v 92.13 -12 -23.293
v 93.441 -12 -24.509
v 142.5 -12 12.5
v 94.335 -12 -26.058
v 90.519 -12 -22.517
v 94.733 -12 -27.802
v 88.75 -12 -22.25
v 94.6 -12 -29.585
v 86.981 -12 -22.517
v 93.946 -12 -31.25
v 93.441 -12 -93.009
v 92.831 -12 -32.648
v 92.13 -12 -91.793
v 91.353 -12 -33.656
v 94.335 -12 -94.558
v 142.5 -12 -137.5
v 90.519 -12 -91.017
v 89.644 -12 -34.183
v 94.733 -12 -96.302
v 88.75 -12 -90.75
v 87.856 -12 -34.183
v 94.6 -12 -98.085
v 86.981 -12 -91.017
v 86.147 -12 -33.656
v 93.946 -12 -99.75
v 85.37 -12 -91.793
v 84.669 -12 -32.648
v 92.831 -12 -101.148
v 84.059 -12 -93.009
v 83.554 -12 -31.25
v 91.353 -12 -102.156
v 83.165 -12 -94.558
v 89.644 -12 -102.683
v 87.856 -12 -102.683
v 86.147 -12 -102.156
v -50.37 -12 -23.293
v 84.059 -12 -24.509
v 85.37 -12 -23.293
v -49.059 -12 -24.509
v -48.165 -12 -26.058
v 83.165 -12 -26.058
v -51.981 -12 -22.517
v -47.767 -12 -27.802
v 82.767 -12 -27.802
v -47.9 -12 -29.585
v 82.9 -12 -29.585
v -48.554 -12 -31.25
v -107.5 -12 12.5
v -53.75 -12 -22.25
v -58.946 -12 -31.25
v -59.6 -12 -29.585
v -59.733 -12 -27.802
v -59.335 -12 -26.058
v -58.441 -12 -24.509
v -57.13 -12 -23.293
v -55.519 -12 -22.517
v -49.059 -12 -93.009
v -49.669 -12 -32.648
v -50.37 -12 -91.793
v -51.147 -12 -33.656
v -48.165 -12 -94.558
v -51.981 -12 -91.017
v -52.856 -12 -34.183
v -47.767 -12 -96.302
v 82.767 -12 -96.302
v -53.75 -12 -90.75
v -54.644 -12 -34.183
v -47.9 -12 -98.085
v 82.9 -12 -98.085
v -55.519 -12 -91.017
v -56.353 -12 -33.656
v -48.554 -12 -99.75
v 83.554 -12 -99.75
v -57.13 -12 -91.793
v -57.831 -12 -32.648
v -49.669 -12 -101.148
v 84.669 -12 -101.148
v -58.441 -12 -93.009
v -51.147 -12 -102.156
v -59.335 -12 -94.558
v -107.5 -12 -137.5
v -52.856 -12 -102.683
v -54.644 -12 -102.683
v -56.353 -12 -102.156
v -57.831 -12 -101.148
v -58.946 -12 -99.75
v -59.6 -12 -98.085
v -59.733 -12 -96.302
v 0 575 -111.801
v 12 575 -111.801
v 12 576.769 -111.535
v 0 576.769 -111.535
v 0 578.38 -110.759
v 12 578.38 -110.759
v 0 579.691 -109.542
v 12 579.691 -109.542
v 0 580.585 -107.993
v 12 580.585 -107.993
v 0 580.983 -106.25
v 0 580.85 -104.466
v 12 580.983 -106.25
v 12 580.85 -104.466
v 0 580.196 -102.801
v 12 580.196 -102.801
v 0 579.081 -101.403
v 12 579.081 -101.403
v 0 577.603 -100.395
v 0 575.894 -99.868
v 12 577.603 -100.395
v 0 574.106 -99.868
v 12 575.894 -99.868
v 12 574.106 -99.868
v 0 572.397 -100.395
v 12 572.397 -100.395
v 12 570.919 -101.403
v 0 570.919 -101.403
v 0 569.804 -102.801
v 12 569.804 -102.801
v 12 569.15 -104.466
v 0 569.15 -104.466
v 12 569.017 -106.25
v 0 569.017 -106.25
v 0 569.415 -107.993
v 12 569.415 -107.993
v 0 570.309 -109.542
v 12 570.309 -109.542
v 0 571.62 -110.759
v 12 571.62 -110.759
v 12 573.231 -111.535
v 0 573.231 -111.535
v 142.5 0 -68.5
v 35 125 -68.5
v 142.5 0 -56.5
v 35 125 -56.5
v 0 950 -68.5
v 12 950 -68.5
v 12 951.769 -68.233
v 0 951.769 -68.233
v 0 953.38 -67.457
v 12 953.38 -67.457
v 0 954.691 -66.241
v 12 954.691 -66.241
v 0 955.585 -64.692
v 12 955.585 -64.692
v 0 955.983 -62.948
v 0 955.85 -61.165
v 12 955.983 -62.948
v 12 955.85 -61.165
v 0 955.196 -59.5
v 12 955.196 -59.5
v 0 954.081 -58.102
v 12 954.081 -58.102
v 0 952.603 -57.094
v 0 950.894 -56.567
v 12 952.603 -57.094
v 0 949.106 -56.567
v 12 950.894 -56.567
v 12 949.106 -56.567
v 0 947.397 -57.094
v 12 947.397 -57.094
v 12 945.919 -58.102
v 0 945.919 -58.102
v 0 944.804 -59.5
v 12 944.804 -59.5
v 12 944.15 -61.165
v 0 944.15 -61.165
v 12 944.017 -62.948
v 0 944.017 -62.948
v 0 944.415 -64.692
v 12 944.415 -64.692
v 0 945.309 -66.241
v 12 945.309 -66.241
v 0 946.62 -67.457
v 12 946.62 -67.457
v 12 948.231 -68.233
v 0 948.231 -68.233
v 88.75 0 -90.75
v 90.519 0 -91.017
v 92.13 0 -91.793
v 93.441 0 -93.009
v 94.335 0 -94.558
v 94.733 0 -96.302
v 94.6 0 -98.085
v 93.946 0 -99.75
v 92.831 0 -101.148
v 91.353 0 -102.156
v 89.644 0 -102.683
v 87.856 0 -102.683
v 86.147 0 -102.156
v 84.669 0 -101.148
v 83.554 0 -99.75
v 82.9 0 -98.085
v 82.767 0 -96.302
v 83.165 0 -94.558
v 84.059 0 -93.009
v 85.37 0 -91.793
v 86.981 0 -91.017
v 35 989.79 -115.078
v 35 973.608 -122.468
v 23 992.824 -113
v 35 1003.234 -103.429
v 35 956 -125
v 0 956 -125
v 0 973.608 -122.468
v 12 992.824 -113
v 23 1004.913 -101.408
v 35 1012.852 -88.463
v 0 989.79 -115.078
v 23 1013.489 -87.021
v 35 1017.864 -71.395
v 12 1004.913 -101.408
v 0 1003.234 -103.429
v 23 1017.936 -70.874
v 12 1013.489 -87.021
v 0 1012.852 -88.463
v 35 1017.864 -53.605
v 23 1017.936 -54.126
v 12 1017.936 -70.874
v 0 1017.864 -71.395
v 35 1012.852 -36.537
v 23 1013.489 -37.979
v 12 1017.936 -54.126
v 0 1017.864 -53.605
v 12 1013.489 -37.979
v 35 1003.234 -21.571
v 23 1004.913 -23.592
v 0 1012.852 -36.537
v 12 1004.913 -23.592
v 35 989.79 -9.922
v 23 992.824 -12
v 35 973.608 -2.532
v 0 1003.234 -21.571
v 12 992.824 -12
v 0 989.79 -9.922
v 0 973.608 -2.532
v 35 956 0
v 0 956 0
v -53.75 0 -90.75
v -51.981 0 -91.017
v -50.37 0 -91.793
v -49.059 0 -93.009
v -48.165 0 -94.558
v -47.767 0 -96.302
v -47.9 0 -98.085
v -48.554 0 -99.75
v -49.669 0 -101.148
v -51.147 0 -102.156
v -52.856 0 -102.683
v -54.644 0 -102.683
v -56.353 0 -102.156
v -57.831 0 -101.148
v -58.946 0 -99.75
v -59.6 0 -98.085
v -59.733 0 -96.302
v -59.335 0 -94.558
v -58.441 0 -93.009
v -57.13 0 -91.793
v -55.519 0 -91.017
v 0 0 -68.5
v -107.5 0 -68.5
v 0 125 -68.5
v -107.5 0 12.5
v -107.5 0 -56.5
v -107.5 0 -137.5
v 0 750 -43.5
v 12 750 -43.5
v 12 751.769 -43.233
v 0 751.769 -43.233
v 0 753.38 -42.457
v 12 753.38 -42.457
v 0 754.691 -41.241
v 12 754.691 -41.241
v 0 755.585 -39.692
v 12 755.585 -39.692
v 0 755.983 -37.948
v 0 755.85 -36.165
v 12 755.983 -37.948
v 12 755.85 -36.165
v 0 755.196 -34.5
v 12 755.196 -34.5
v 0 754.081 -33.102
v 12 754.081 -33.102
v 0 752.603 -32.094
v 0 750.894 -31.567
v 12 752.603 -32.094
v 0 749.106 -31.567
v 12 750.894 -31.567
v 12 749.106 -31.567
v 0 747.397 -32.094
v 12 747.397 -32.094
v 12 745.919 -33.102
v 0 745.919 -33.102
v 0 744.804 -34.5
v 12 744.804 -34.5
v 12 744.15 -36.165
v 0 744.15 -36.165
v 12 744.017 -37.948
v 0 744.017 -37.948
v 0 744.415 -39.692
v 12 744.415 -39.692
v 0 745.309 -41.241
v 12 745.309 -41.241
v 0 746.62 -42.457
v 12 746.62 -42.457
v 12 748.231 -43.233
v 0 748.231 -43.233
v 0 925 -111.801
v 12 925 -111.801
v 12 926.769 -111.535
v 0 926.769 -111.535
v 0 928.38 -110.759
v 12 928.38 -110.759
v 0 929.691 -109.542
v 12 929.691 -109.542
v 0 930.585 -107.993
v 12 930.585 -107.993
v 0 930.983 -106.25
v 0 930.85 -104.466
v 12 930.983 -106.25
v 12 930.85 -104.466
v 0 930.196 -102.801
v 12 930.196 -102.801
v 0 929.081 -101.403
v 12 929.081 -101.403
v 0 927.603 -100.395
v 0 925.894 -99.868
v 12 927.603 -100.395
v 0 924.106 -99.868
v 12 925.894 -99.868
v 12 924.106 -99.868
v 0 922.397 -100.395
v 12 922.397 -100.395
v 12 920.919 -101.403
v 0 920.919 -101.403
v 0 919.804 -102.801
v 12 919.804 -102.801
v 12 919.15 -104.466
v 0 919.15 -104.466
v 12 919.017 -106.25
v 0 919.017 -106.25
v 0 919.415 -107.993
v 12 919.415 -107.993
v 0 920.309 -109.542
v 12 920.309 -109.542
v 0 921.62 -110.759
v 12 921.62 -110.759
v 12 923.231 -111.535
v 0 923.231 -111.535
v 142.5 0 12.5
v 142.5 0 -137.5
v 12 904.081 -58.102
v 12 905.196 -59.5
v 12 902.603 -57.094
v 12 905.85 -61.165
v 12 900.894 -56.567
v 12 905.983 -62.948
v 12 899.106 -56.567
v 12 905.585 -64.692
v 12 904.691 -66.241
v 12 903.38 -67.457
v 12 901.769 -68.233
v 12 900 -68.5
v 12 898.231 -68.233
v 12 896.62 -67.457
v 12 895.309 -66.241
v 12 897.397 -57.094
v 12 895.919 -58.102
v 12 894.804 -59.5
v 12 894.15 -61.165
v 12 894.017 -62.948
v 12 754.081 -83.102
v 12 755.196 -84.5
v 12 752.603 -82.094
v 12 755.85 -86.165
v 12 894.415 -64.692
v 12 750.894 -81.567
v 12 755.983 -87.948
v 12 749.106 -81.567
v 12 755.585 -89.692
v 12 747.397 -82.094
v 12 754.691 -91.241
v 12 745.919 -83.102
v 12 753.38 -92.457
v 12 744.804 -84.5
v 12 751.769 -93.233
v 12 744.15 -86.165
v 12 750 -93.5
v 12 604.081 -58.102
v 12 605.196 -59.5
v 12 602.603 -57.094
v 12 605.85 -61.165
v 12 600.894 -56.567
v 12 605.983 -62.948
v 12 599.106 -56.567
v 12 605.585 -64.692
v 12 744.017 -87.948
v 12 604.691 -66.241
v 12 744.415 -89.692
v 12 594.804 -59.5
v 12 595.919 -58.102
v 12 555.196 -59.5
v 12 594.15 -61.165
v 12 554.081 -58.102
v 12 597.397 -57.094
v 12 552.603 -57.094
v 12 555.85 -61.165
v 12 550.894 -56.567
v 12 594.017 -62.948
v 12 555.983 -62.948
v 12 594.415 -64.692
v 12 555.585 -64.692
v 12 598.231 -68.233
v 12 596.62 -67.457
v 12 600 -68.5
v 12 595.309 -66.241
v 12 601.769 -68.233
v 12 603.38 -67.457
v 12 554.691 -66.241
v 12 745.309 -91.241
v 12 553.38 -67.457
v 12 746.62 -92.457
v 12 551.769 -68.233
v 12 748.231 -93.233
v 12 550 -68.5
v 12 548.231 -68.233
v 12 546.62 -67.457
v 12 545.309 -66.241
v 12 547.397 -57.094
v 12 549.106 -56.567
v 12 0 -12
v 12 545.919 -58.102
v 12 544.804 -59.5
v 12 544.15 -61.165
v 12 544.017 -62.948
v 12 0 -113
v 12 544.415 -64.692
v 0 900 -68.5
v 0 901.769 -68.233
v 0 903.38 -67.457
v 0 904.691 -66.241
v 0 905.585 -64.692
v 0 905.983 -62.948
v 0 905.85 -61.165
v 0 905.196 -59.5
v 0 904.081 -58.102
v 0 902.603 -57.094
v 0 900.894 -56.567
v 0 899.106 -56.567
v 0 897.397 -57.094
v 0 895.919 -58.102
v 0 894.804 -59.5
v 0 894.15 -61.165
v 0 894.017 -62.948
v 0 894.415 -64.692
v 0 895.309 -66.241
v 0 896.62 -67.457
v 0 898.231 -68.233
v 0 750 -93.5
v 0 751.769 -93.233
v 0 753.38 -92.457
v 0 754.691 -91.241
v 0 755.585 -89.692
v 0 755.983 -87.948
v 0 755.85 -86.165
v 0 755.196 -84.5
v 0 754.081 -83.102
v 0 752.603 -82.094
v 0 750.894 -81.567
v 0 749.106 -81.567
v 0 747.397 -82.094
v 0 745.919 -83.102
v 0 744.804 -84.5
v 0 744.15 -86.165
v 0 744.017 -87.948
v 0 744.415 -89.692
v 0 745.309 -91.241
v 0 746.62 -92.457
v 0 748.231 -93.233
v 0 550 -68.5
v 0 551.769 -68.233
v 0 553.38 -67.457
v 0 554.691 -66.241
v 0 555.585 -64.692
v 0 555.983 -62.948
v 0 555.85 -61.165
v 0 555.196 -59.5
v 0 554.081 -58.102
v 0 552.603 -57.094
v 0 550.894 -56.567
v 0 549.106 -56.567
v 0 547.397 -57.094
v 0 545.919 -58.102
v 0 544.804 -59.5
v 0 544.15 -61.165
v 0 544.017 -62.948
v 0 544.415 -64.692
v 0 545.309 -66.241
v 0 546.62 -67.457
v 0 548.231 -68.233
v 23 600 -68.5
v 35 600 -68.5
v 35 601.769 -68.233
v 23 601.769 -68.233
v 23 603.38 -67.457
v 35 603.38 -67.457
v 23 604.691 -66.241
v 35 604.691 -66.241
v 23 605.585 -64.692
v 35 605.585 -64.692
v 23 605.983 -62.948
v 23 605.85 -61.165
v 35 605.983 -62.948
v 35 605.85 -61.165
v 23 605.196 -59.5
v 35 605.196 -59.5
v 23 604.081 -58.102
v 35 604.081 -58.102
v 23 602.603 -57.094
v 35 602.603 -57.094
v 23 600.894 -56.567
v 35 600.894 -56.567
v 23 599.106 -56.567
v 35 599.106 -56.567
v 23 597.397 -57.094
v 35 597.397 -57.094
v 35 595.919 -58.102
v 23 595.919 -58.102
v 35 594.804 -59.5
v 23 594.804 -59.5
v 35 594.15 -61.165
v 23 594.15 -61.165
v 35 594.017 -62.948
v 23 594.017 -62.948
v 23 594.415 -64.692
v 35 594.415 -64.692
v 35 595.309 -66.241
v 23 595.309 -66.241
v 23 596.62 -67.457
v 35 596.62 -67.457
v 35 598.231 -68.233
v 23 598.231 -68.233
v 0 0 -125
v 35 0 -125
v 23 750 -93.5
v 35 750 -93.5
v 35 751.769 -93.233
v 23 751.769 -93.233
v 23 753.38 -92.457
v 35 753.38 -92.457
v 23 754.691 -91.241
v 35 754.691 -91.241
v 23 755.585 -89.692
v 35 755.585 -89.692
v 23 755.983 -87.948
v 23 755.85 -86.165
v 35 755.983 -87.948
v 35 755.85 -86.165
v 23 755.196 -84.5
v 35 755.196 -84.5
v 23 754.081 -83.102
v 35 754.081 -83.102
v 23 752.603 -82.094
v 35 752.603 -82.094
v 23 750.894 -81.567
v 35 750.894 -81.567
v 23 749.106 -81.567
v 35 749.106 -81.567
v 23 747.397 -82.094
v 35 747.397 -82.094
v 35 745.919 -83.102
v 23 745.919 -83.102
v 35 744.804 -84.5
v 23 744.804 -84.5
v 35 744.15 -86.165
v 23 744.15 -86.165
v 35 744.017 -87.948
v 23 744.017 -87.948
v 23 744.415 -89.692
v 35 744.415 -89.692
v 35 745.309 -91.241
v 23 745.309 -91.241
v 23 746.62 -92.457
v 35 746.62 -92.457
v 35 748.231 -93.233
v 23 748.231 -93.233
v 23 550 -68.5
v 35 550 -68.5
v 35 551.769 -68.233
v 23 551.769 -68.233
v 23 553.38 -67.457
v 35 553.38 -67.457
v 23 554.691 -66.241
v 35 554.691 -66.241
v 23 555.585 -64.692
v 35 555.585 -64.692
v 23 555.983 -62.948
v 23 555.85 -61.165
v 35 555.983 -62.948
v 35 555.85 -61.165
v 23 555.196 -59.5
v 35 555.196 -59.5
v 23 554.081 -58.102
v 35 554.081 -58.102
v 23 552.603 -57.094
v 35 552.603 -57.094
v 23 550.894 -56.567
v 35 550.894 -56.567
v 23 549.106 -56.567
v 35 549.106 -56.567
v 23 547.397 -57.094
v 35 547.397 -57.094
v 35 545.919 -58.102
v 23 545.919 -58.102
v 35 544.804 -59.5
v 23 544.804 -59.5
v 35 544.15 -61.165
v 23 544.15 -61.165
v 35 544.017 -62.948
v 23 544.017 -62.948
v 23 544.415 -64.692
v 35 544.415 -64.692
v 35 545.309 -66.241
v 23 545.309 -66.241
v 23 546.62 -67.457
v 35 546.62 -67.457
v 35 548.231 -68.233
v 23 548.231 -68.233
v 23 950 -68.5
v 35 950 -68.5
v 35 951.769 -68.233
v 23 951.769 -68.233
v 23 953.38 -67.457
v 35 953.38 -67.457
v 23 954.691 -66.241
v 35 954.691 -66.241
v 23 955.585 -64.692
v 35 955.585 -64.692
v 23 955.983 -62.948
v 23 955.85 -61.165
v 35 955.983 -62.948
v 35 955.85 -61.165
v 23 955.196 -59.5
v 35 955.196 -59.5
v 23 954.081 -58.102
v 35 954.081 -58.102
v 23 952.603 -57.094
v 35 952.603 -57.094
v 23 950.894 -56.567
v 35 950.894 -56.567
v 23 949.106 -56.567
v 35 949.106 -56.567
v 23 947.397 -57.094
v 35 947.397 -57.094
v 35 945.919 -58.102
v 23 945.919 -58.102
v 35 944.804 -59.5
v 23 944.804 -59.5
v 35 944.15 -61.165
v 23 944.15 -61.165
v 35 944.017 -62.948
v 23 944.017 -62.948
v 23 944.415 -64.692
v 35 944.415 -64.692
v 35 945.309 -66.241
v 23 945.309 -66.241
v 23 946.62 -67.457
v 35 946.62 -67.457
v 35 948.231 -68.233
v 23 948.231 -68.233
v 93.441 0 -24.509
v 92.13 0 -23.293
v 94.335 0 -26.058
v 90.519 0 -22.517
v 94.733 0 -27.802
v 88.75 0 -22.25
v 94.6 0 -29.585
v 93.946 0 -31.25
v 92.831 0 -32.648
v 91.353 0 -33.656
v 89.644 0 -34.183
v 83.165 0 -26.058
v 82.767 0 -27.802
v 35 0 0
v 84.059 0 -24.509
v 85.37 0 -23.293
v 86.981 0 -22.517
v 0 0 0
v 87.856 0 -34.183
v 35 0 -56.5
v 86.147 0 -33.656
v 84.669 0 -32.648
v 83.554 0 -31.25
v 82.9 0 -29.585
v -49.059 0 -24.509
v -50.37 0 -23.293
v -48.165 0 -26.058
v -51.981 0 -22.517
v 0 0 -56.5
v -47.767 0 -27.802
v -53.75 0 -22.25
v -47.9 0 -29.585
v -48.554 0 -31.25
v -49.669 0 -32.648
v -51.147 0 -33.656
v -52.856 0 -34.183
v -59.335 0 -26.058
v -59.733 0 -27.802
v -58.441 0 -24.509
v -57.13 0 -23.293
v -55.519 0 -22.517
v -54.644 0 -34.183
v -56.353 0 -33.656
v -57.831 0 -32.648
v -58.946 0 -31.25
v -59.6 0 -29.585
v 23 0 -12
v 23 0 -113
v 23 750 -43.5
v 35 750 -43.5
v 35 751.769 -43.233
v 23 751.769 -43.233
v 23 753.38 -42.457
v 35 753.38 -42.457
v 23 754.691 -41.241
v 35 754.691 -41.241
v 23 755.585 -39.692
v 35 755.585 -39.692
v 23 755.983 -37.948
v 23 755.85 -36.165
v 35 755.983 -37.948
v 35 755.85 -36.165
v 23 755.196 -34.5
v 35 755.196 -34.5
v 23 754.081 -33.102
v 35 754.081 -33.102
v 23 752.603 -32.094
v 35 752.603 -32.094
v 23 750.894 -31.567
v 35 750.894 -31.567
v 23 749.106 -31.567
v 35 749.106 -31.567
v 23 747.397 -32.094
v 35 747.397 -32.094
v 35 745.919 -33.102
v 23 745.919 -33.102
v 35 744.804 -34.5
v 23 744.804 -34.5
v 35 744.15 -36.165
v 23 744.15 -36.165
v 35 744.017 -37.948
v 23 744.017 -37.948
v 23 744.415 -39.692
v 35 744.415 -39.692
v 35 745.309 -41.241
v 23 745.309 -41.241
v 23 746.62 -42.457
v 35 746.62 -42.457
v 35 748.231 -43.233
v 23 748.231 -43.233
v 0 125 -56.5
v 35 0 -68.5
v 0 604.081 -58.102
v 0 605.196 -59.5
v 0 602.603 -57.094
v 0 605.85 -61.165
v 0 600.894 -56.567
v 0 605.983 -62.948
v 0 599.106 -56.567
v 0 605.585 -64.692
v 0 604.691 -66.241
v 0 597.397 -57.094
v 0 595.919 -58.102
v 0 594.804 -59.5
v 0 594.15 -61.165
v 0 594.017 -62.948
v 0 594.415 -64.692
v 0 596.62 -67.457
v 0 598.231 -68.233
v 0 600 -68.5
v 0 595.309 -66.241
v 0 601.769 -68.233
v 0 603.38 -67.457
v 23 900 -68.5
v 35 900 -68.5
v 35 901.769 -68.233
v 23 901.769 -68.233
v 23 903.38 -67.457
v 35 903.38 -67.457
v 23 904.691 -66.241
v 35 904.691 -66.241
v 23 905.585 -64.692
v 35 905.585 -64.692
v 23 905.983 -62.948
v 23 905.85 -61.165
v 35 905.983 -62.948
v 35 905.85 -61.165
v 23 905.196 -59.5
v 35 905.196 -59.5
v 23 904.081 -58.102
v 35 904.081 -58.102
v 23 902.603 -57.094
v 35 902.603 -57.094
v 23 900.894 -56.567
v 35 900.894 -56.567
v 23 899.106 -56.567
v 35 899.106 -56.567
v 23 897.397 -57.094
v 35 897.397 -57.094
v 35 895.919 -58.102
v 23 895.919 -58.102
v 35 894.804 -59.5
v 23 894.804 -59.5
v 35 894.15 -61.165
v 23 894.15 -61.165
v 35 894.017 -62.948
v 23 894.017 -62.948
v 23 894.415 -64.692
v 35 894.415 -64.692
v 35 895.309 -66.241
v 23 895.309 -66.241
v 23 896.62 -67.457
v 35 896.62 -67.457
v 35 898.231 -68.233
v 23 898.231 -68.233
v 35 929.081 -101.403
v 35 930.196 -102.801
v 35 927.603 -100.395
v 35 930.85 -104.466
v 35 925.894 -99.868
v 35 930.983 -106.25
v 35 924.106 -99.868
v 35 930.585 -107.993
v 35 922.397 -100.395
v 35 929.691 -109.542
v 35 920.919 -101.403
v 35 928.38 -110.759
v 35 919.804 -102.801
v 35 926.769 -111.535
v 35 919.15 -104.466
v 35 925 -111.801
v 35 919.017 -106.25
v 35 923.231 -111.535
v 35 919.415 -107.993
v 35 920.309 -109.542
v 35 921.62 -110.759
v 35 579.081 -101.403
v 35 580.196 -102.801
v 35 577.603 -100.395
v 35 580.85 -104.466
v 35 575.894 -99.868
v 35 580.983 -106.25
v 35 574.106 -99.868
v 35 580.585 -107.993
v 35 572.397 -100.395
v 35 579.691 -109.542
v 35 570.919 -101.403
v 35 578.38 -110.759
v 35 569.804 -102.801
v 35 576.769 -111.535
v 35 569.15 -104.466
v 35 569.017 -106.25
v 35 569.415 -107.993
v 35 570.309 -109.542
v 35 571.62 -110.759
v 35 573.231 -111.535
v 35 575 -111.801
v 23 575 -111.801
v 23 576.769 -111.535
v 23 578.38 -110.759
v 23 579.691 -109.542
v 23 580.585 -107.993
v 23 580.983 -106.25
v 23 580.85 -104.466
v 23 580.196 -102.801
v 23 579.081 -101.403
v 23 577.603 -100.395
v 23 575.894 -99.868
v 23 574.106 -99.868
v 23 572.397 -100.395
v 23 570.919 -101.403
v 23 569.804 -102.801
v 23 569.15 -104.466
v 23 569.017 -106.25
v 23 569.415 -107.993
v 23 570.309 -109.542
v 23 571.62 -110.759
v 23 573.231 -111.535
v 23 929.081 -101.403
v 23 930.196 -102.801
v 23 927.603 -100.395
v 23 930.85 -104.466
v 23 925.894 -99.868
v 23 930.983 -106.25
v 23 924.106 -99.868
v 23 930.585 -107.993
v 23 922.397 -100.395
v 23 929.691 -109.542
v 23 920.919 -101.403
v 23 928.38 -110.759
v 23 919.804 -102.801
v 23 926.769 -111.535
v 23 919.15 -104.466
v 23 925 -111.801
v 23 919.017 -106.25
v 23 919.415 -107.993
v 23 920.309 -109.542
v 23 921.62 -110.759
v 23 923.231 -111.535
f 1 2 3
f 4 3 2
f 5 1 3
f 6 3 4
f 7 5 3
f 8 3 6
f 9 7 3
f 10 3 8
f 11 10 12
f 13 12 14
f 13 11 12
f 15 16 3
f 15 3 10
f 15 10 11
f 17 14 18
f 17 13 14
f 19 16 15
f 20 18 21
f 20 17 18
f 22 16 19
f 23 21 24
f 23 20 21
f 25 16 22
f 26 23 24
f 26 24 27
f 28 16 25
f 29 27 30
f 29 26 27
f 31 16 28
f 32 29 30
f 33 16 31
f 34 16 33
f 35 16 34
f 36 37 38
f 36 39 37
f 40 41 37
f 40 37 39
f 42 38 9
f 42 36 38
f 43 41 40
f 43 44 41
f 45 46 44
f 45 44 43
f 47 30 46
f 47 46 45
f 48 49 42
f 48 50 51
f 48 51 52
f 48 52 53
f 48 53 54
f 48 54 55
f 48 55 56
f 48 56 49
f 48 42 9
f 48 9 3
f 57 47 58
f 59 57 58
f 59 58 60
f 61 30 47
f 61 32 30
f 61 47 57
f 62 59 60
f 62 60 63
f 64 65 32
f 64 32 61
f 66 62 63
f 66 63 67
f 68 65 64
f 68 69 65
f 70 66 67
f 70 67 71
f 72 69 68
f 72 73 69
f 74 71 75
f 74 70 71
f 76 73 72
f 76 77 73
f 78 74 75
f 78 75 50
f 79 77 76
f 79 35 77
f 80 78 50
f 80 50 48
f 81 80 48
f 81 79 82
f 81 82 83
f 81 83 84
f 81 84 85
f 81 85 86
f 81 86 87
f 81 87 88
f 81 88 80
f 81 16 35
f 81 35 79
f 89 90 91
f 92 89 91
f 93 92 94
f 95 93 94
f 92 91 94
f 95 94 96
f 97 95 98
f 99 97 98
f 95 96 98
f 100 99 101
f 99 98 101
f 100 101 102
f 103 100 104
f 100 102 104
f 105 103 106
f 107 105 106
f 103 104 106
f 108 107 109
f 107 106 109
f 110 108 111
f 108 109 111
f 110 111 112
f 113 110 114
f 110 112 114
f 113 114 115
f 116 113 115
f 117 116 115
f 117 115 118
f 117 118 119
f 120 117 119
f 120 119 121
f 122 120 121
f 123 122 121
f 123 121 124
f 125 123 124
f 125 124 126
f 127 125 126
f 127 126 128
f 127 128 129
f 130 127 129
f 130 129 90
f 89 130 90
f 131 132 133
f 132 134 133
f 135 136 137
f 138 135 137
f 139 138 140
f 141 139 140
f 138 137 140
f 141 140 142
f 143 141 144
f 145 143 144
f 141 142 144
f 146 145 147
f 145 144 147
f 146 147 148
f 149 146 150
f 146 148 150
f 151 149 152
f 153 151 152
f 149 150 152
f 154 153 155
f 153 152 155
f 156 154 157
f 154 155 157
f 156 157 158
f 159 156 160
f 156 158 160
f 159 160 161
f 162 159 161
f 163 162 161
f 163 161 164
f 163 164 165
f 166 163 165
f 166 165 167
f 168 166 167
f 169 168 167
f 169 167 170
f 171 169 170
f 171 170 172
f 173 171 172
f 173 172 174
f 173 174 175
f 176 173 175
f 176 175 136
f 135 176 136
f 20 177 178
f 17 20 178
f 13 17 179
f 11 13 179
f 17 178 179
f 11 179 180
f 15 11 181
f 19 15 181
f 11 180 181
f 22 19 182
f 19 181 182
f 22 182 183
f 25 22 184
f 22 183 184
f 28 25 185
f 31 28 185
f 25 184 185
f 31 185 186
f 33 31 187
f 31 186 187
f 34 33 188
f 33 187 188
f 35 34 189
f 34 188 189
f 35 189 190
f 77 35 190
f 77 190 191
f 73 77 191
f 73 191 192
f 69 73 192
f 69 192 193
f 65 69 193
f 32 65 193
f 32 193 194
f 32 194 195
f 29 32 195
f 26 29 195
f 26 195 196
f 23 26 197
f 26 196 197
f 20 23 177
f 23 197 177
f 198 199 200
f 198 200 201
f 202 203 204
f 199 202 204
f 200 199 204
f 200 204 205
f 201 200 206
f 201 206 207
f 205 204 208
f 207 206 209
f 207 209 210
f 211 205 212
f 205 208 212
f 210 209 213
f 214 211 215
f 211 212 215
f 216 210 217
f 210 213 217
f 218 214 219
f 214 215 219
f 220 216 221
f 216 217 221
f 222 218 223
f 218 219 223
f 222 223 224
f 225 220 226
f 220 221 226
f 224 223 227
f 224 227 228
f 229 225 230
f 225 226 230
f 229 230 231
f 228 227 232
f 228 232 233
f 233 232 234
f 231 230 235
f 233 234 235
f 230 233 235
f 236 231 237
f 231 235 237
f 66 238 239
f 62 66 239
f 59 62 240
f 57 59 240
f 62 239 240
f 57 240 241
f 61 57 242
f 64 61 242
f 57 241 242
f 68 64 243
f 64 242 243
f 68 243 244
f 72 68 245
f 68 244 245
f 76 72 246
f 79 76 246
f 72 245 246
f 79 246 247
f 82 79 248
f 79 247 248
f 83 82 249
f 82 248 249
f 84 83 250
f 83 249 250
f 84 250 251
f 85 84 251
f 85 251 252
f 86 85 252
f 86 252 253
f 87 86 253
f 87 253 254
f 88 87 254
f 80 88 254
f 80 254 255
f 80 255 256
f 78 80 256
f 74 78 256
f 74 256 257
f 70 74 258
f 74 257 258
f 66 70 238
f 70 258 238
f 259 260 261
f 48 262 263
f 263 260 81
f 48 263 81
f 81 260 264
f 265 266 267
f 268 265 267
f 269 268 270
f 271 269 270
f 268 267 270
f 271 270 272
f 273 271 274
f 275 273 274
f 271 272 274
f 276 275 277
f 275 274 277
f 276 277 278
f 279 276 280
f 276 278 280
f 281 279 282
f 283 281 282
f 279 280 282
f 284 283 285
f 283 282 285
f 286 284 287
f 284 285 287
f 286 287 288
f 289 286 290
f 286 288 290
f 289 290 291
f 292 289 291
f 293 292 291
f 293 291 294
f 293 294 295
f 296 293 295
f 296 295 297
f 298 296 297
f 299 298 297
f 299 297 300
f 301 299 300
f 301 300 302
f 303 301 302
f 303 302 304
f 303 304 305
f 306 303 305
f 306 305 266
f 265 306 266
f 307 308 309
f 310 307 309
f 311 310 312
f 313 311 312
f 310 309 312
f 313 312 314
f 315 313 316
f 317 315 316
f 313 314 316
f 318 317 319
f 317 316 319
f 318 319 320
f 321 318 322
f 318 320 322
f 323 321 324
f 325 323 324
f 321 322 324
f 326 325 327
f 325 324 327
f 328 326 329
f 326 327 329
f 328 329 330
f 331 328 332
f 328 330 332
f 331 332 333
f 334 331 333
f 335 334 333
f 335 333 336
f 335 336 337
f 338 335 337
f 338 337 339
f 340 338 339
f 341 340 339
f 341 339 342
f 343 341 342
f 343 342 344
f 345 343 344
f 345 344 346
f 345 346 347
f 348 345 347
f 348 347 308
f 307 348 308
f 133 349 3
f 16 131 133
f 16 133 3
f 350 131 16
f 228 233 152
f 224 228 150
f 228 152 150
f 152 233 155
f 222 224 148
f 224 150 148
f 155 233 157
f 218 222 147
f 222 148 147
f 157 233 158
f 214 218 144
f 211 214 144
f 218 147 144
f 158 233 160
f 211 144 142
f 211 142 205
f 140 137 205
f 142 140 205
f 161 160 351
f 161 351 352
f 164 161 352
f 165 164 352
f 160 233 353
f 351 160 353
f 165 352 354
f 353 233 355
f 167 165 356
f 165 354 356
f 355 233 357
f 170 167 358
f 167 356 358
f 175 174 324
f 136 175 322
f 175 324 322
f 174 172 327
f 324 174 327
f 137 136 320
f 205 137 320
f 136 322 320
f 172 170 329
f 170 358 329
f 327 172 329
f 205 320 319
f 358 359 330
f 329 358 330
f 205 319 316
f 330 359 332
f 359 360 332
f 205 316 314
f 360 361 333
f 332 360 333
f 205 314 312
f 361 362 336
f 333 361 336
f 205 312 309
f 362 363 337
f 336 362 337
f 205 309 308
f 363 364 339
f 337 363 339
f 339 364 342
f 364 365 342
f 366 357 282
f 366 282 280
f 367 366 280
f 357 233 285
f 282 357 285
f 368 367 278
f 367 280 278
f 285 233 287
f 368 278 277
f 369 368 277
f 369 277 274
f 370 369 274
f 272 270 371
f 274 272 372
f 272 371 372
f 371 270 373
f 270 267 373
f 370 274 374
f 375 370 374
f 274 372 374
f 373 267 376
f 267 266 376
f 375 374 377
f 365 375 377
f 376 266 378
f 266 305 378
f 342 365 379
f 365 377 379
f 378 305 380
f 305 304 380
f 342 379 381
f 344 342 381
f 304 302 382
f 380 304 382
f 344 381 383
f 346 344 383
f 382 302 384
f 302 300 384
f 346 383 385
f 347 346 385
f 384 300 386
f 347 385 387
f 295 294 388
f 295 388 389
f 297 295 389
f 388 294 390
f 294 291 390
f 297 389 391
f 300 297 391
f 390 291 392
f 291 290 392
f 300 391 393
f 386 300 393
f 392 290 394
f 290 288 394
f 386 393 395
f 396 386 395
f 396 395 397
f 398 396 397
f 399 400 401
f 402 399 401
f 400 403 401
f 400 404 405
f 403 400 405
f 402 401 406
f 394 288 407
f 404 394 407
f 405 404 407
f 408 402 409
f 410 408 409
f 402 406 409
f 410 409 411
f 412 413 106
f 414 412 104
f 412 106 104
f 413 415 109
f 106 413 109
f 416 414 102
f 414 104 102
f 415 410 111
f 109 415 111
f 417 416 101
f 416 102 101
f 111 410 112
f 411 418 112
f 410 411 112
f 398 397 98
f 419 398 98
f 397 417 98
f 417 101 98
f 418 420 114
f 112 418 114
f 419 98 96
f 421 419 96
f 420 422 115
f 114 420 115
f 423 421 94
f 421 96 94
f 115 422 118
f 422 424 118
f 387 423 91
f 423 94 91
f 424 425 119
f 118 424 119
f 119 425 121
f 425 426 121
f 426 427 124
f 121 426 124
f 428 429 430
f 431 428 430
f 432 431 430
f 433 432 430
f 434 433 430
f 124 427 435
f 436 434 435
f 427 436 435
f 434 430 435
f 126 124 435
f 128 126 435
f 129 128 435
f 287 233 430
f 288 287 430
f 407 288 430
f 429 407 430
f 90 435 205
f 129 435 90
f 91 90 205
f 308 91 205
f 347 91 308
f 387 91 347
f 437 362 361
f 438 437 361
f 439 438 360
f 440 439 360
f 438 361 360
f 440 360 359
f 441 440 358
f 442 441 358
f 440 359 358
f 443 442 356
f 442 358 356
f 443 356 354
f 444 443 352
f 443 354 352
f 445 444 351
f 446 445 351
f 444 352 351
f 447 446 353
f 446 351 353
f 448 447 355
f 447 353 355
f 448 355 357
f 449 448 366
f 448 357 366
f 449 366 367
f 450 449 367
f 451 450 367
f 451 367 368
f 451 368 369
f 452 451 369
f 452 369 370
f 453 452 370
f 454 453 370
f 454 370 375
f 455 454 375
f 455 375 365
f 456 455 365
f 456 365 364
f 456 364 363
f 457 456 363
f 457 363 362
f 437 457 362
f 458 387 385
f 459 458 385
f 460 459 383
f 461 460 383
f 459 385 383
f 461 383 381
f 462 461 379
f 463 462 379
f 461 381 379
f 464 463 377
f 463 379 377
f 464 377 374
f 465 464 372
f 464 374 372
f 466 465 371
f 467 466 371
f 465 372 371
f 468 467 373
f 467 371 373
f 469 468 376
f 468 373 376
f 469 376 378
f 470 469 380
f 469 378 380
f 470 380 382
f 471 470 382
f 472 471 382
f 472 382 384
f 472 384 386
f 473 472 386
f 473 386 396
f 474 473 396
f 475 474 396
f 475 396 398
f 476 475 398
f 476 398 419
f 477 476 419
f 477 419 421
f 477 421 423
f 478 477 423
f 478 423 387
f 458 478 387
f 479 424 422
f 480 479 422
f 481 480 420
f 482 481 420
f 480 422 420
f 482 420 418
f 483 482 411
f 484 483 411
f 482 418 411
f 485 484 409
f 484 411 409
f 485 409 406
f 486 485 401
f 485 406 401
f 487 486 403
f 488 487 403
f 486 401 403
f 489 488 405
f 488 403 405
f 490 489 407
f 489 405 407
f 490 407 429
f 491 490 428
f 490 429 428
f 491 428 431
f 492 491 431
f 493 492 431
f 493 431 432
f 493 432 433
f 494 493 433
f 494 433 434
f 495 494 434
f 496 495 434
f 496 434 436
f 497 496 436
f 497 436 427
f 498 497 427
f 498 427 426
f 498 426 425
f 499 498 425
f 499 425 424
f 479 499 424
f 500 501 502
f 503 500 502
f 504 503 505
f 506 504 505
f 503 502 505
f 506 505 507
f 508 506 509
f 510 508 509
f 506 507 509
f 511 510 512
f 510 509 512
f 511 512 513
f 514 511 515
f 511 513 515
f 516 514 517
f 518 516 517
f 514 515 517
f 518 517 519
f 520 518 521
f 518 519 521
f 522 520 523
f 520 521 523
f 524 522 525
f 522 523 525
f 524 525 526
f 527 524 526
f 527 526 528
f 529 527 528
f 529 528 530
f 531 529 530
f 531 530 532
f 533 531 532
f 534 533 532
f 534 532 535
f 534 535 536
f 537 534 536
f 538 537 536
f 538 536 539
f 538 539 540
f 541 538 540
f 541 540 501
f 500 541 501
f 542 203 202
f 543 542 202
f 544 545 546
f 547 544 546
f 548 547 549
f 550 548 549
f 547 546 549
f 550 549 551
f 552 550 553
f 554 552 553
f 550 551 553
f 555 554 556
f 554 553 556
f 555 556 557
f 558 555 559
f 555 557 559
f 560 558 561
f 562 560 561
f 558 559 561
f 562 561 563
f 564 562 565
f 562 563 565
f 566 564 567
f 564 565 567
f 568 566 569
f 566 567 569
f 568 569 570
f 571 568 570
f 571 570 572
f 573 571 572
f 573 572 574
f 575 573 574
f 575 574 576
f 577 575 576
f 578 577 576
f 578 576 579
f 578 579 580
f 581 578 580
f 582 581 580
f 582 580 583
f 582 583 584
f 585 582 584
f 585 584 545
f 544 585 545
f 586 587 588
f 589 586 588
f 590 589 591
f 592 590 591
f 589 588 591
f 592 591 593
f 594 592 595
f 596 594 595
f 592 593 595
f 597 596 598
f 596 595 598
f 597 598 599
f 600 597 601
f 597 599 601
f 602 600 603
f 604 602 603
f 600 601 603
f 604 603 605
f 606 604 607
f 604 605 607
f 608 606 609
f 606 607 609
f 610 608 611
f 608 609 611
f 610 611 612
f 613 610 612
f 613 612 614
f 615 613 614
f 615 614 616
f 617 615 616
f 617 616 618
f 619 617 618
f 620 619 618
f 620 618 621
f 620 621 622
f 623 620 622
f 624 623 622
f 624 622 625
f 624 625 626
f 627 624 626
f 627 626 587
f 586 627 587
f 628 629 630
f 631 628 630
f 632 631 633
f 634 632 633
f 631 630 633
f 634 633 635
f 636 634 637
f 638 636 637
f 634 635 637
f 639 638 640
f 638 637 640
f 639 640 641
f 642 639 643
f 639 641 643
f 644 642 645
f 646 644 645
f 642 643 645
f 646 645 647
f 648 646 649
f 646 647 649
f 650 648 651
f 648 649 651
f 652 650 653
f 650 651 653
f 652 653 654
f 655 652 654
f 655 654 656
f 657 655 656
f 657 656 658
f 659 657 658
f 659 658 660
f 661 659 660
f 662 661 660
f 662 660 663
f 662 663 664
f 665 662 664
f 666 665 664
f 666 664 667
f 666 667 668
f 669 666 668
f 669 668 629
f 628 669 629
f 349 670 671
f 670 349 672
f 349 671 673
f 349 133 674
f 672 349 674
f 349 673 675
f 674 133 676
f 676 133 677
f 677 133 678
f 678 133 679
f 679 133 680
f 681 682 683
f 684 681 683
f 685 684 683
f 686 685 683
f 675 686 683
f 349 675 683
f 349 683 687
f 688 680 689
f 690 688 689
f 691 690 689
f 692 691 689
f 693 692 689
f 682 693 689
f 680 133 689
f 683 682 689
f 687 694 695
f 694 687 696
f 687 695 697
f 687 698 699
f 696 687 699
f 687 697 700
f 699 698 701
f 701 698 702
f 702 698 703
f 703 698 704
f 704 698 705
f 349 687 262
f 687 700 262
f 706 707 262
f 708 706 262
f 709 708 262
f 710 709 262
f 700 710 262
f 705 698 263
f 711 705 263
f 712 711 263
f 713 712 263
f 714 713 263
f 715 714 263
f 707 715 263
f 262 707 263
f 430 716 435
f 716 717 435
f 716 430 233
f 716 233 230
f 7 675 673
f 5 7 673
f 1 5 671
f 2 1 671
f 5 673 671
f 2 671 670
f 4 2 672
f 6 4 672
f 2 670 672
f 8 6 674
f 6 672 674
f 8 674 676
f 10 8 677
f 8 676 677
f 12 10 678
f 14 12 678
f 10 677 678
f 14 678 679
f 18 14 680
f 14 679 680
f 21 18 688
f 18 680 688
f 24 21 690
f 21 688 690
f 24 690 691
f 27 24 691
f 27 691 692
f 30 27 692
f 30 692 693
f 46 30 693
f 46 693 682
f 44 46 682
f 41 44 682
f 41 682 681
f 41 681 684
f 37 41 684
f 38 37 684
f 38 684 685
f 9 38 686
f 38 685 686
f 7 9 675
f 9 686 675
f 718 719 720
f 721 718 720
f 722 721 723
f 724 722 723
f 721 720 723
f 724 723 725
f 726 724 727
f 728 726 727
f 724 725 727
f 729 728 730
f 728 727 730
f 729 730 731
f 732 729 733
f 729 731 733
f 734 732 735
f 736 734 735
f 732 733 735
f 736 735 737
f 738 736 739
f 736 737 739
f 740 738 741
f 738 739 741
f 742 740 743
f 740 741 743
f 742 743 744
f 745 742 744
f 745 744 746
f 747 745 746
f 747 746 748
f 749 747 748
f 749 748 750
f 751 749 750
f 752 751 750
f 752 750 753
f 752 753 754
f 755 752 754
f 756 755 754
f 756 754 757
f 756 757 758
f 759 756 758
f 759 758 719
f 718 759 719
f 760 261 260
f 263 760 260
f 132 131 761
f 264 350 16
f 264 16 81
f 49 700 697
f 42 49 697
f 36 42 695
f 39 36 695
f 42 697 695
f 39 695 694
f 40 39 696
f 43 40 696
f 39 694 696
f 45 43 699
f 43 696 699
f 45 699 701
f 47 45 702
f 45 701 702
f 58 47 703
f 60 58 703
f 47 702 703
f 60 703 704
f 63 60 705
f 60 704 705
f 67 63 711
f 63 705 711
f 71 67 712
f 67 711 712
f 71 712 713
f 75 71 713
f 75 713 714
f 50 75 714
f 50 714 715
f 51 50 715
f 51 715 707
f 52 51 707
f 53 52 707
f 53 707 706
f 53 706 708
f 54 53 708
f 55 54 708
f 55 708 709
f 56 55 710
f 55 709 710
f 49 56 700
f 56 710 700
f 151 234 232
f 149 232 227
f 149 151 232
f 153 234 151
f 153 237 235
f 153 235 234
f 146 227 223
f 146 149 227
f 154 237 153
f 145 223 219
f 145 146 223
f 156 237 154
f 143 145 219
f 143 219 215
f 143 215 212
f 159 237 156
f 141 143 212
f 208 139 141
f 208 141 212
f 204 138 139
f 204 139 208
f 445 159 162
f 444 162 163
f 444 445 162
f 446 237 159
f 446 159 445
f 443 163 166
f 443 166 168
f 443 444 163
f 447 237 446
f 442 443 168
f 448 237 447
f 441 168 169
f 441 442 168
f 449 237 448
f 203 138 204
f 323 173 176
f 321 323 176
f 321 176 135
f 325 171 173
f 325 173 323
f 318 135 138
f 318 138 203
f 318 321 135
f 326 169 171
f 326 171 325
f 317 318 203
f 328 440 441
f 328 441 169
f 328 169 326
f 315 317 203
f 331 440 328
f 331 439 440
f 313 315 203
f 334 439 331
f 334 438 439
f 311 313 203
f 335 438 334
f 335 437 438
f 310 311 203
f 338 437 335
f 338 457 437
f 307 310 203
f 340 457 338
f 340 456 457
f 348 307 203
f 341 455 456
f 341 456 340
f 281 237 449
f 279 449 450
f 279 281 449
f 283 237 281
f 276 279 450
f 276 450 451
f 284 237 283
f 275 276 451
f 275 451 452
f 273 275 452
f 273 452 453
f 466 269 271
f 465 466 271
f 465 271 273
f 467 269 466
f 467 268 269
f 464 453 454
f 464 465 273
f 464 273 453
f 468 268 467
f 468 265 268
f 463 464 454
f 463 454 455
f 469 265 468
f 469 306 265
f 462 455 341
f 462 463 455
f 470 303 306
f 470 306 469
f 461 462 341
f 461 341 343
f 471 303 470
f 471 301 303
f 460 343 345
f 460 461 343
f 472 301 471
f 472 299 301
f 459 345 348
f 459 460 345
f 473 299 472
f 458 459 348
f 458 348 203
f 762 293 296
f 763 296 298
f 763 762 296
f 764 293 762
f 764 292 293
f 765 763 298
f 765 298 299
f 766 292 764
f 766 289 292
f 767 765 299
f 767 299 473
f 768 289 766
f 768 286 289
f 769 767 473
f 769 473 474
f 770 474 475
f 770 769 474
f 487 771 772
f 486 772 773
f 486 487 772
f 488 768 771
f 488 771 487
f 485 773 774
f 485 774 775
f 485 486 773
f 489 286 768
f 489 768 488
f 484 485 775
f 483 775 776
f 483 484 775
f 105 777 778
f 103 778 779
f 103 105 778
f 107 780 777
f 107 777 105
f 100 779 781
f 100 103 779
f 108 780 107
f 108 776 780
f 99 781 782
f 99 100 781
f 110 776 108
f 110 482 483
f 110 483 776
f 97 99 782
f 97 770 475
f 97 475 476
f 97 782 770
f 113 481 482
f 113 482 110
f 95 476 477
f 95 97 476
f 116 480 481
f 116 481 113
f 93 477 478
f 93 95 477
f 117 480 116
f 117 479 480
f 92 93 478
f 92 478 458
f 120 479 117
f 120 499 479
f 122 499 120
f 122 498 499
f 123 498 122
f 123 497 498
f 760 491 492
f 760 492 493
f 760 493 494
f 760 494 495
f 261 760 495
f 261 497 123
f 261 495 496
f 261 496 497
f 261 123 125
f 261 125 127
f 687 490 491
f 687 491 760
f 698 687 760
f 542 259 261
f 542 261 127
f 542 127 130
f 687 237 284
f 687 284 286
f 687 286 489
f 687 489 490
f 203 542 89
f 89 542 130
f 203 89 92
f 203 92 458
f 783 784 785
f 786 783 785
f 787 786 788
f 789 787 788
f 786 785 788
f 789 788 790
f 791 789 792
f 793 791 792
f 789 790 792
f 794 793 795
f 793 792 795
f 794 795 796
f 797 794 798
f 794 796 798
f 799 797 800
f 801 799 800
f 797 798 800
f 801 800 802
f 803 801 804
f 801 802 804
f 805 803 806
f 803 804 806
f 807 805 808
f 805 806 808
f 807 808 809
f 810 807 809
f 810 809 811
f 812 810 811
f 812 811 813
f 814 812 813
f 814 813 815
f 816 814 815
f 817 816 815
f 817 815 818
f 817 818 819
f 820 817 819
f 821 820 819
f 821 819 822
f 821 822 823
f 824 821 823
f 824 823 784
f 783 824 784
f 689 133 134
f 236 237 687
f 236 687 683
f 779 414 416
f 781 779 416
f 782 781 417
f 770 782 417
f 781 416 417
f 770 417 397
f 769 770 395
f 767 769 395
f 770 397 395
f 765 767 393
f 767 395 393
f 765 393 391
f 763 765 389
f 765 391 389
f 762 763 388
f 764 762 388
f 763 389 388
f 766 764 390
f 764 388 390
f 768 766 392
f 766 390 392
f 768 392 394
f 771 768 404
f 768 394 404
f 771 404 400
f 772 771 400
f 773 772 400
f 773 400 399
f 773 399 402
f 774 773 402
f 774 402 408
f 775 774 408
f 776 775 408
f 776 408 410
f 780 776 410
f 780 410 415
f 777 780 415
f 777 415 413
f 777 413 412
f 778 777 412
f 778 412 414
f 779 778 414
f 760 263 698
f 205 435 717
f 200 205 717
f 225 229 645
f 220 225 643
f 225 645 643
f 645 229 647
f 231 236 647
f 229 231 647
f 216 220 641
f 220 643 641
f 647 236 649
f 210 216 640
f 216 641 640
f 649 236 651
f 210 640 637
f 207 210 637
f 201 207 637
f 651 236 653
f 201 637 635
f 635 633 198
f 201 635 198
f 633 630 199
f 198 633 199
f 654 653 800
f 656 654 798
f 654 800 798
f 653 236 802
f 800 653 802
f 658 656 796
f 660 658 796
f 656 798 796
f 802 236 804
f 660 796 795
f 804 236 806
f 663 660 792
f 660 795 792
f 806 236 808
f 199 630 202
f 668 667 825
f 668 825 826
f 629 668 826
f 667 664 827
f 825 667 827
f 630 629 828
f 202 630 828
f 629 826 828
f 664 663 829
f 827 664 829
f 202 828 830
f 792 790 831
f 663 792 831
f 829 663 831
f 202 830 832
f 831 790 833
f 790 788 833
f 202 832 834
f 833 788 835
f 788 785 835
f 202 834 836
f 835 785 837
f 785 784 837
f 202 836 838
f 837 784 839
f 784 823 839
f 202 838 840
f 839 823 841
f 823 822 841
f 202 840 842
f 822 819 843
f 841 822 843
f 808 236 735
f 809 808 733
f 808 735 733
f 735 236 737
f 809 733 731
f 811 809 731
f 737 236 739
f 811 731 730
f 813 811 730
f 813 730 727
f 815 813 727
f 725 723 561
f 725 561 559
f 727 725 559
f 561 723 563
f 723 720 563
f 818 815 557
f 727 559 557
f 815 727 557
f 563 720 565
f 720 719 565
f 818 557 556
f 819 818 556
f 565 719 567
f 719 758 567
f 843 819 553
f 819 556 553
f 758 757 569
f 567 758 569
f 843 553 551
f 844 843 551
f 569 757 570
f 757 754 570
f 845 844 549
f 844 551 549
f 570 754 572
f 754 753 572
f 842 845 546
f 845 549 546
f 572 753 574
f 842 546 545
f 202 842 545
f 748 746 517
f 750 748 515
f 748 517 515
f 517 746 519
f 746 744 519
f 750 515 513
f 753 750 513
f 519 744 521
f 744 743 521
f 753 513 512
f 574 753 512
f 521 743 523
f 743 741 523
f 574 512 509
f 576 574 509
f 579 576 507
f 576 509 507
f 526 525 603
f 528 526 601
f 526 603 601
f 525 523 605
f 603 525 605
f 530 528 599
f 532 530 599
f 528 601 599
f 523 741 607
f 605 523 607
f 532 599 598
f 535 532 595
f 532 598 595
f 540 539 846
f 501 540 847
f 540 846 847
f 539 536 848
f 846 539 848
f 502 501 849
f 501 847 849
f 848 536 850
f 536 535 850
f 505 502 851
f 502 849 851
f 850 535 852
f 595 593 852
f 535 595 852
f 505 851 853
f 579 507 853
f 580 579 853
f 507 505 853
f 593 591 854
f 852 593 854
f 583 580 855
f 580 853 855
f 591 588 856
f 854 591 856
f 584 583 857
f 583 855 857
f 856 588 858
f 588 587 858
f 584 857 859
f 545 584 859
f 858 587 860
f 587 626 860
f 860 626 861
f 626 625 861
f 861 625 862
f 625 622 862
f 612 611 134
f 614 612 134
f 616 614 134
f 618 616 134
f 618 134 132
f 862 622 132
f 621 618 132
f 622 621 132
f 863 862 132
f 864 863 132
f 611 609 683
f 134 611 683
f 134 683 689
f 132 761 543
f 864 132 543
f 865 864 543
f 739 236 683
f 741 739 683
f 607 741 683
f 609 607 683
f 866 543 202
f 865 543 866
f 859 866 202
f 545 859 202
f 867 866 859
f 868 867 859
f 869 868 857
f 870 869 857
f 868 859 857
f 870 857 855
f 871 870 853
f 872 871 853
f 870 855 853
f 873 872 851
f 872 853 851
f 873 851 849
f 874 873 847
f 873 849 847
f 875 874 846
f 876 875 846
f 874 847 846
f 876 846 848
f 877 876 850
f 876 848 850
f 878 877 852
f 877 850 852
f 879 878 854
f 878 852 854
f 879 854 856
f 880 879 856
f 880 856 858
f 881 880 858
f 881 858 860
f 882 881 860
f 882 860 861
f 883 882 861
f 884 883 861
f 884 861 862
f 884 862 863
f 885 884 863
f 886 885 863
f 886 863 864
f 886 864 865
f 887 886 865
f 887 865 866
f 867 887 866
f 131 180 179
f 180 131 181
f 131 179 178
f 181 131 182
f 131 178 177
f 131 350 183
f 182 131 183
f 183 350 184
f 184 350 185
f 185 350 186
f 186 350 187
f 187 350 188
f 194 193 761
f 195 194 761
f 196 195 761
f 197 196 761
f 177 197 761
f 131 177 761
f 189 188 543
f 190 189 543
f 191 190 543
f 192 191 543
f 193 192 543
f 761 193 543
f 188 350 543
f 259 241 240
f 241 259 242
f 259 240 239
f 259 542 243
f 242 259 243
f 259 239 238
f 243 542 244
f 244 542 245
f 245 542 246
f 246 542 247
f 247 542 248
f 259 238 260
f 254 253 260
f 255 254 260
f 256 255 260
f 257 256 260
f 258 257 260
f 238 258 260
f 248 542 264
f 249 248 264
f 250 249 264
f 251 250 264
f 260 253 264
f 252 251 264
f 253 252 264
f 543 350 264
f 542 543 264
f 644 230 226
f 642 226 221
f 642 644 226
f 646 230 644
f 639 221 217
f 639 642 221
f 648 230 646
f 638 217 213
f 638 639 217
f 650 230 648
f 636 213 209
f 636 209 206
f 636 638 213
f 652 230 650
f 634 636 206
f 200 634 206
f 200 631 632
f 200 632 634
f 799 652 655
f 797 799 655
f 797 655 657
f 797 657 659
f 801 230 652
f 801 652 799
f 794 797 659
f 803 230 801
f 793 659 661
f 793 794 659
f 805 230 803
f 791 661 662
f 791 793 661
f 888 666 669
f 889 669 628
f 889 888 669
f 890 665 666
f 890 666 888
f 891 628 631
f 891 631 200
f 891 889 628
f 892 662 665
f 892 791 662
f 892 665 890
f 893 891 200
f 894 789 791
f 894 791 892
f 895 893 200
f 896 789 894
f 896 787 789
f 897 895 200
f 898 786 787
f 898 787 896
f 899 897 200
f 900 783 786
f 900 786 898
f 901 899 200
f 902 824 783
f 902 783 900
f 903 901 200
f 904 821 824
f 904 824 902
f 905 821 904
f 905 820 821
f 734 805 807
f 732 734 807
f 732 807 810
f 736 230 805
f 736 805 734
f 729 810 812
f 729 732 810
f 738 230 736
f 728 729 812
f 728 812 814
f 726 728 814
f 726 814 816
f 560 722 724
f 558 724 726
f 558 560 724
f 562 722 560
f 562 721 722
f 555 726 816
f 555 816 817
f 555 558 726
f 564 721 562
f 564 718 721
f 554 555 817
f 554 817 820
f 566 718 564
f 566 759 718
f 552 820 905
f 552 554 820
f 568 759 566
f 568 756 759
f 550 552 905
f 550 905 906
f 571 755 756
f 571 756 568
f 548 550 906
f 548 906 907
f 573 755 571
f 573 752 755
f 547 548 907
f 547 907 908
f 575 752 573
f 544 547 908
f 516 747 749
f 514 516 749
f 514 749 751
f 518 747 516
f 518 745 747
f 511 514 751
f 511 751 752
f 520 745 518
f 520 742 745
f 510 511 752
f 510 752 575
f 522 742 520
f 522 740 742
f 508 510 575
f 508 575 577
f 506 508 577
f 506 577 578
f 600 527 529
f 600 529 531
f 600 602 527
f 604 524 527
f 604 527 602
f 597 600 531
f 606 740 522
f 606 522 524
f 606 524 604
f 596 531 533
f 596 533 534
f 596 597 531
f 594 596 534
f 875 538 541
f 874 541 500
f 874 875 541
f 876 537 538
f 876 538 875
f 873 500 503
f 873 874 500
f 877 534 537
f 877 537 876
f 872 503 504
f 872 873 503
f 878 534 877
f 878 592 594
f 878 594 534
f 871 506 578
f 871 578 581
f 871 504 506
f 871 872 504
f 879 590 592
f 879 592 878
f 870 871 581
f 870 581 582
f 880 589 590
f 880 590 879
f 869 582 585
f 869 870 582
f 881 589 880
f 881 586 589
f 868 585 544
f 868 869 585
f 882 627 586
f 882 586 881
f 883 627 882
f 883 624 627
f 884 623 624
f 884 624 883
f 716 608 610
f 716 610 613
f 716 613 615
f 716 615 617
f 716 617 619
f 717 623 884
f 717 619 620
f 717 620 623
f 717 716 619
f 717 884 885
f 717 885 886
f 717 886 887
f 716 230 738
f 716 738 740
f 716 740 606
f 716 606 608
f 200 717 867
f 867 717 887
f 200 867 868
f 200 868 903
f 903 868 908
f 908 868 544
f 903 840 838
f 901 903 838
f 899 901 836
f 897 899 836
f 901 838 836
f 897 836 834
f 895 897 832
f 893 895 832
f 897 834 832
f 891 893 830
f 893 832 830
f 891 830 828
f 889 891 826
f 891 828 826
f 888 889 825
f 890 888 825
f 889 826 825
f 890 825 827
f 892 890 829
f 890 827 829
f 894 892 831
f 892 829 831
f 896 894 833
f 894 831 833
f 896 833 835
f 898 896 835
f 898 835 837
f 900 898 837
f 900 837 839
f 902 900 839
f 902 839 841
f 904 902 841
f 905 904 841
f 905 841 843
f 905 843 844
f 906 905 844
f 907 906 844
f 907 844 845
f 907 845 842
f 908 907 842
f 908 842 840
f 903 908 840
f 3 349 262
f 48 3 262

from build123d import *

# Parameters (mm, degrees)
SKETCH2_W               = 35
SKETCH2_H               = 125
SKETCH2_W_2             = 11
SKETCH2_H_2             = 101
BOSS_EXTRUDE1_DEPTH     = 1400
SKETCH3_R               = 6
CUT_EXTRUDE1_DEPTH      = 1407.004978654
SKETCH4_W               = 250
SKETCH4_H               = 150
BOSS_EXTRUDE2_DEPTH     = 12
SKETCH5_W               = 250
SKETCH5_H               = 150
BOSS_EXTRUDE3_DEPTH     = 12
BOSS_EXTRUDE4_START     = -62.5
BOSS_EXTRUDE4_DEPTH     = 6
SKETCH8_R               = 6
CUT_EXTRUDE2_DEPTH      = 12
CUT_EXTRUDE3_DEPTH      = 1426.81783549
CUT_EXTRUDE3_DEPTH_BACK = 1426.81783549


with BuildPart() as part:
    # Sketch2 → Boss-Extrude1 (new body)
    with BuildSketch(Plane(origin=(0, 0, 0), x_dir=(1, 0, 0), z_dir=(0, 1, 0))):
        with Locations((17.5, 62.5)):
            Rectangle(SKETCH2_W, SKETCH2_H)
        with Locations((17.5, 62.5)):
            Rectangle(SKETCH2_W_2, SKETCH2_H_2, mode=Mode.SUBTRACT)
    extrude(amount=BOSS_EXTRUDE1_DEPTH)

    # Sketch3 → Cut-Extrude1 (cut, through all)
    with BuildSketch(Plane(origin=(35, 0, 0), x_dir=(0, 0, -1), z_dir=(1, 0, 0))):
        with Locations((62.5, 950)):
            Circle(SKETCH3_R)
        with Locations((62.5, 900)):
            Circle(SKETCH3_R)
        with Locations((105.801270189, 925)):
            Circle(SKETCH3_R)
        with Locations((37.5, 750)):
            Circle(SKETCH3_R)
        with Locations((87.5, 750)):
            Circle(SKETCH3_R)
        with Locations((105.801270189, 575)):
            Circle(SKETCH3_R)
        with Locations((62.5, 600)):
            Circle(SKETCH3_R)
        with Locations((62.5, 550)):
            Circle(SKETCH3_R)
    extrude(amount=-CUT_EXTRUDE1_DEPTH, mode=Mode.SUBTRACT)

    # Sketch4 → Boss-Extrude2 (add)
    with BuildSketch(Plane(origin=(0, 0, 0), x_dir=(-1, 0, 0), z_dir=(0, -1, 0))):
        with Locations((-17.5, 62.5)):
            Rectangle(SKETCH4_W, SKETCH4_H)
    extrude(amount=BOSS_EXTRUDE2_DEPTH)

    # Sketch5 → Boss-Extrude3 (add)
    with BuildSketch(Plane(origin=(0, 1400, 0), x_dir=(1, 0, 0), z_dir=(0, 1, 0))):
        with Locations((17.5, 62.5)):
            Rectangle(SKETCH5_W, SKETCH5_H)
    extrude(amount=BOSS_EXTRUDE3_DEPTH)

    # Sketch7 → Boss-Extrude4 (add, symmetric)
    with BuildSketch(Plane(origin=(0, 0, -125), x_dir=(-1, 0, 0), z_dir=(0, 0, -1)).offset(BOSS_EXTRUDE4_START)):
        Polygon((-35, 0), (-35, 125), (-142.5, 0), align=None)
        Polygon((0, 125), (107.5, 0), (0, 0), align=None)
    extrude(amount=BOSS_EXTRUDE4_DEPTH, both=True)

    # Sketch8 → Cut-Extrude2 (cut)
    with BuildSketch(Plane(origin=(0, 0, 0), x_dir=(1, 0, 0), z_dir=(0, 1, 0))):
        with Locations(Location((-53.75, 28.25, 0), (0, 0, 270))):
            Circle(SKETCH8_R)
        with Locations(Location((-53.75, 96.75, 0), (0, 0, 270))):
            Circle(SKETCH8_R)
        with Locations(Location((88.75, 28.25, 0), (0, 0, 270))):
            Circle(SKETCH8_R)
        with Locations(Location((88.75, 96.75, 0), (0, 0, 270))):
            Circle(SKETCH8_R)
    extrude(amount=-CUT_EXTRUDE2_DEPTH, mode=Mode.SUBTRACT)

    # Sketch9 → Cut-Extrude3 (cut, two sides: drawn at the far end of the back side and taken through both)
    with BuildSketch(Plane(origin=(35, 0, 0), x_dir=(0, 0, -1), z_dir=(1, 0, 0)).offset(-CUT_EXTRUDE3_DEPTH_BACK)):
        with BuildLine():
            Line((-163.728557717, 1439.709556919), (272.302726902, 1439.709556919))
            Line((272.302726902, 1439.709556919), (272.302726902, 682.852602279))
            Line((272.302726902, 682.852602279), (125, 682.852602279))
            Line((125, 682.852602279), (125, 956))
            ThreePointArc((125, 956), (62.5, 1018.5), (0, 956))
            Line((0, 956), (0, 682.852602279))
            Line((0, 682.852602279), (-163.728557717, 682.852602279))
            Line((-163.728557717, 682.852602279), (-163.728557717, 1439.709556919))
        make_face()
    extrude(amount=CUT_EXTRUDE3_DEPTH + CUT_EXTRUDE3_DEPTH_BACK, mode=Mode.SUBTRACT)


solid = part.part
